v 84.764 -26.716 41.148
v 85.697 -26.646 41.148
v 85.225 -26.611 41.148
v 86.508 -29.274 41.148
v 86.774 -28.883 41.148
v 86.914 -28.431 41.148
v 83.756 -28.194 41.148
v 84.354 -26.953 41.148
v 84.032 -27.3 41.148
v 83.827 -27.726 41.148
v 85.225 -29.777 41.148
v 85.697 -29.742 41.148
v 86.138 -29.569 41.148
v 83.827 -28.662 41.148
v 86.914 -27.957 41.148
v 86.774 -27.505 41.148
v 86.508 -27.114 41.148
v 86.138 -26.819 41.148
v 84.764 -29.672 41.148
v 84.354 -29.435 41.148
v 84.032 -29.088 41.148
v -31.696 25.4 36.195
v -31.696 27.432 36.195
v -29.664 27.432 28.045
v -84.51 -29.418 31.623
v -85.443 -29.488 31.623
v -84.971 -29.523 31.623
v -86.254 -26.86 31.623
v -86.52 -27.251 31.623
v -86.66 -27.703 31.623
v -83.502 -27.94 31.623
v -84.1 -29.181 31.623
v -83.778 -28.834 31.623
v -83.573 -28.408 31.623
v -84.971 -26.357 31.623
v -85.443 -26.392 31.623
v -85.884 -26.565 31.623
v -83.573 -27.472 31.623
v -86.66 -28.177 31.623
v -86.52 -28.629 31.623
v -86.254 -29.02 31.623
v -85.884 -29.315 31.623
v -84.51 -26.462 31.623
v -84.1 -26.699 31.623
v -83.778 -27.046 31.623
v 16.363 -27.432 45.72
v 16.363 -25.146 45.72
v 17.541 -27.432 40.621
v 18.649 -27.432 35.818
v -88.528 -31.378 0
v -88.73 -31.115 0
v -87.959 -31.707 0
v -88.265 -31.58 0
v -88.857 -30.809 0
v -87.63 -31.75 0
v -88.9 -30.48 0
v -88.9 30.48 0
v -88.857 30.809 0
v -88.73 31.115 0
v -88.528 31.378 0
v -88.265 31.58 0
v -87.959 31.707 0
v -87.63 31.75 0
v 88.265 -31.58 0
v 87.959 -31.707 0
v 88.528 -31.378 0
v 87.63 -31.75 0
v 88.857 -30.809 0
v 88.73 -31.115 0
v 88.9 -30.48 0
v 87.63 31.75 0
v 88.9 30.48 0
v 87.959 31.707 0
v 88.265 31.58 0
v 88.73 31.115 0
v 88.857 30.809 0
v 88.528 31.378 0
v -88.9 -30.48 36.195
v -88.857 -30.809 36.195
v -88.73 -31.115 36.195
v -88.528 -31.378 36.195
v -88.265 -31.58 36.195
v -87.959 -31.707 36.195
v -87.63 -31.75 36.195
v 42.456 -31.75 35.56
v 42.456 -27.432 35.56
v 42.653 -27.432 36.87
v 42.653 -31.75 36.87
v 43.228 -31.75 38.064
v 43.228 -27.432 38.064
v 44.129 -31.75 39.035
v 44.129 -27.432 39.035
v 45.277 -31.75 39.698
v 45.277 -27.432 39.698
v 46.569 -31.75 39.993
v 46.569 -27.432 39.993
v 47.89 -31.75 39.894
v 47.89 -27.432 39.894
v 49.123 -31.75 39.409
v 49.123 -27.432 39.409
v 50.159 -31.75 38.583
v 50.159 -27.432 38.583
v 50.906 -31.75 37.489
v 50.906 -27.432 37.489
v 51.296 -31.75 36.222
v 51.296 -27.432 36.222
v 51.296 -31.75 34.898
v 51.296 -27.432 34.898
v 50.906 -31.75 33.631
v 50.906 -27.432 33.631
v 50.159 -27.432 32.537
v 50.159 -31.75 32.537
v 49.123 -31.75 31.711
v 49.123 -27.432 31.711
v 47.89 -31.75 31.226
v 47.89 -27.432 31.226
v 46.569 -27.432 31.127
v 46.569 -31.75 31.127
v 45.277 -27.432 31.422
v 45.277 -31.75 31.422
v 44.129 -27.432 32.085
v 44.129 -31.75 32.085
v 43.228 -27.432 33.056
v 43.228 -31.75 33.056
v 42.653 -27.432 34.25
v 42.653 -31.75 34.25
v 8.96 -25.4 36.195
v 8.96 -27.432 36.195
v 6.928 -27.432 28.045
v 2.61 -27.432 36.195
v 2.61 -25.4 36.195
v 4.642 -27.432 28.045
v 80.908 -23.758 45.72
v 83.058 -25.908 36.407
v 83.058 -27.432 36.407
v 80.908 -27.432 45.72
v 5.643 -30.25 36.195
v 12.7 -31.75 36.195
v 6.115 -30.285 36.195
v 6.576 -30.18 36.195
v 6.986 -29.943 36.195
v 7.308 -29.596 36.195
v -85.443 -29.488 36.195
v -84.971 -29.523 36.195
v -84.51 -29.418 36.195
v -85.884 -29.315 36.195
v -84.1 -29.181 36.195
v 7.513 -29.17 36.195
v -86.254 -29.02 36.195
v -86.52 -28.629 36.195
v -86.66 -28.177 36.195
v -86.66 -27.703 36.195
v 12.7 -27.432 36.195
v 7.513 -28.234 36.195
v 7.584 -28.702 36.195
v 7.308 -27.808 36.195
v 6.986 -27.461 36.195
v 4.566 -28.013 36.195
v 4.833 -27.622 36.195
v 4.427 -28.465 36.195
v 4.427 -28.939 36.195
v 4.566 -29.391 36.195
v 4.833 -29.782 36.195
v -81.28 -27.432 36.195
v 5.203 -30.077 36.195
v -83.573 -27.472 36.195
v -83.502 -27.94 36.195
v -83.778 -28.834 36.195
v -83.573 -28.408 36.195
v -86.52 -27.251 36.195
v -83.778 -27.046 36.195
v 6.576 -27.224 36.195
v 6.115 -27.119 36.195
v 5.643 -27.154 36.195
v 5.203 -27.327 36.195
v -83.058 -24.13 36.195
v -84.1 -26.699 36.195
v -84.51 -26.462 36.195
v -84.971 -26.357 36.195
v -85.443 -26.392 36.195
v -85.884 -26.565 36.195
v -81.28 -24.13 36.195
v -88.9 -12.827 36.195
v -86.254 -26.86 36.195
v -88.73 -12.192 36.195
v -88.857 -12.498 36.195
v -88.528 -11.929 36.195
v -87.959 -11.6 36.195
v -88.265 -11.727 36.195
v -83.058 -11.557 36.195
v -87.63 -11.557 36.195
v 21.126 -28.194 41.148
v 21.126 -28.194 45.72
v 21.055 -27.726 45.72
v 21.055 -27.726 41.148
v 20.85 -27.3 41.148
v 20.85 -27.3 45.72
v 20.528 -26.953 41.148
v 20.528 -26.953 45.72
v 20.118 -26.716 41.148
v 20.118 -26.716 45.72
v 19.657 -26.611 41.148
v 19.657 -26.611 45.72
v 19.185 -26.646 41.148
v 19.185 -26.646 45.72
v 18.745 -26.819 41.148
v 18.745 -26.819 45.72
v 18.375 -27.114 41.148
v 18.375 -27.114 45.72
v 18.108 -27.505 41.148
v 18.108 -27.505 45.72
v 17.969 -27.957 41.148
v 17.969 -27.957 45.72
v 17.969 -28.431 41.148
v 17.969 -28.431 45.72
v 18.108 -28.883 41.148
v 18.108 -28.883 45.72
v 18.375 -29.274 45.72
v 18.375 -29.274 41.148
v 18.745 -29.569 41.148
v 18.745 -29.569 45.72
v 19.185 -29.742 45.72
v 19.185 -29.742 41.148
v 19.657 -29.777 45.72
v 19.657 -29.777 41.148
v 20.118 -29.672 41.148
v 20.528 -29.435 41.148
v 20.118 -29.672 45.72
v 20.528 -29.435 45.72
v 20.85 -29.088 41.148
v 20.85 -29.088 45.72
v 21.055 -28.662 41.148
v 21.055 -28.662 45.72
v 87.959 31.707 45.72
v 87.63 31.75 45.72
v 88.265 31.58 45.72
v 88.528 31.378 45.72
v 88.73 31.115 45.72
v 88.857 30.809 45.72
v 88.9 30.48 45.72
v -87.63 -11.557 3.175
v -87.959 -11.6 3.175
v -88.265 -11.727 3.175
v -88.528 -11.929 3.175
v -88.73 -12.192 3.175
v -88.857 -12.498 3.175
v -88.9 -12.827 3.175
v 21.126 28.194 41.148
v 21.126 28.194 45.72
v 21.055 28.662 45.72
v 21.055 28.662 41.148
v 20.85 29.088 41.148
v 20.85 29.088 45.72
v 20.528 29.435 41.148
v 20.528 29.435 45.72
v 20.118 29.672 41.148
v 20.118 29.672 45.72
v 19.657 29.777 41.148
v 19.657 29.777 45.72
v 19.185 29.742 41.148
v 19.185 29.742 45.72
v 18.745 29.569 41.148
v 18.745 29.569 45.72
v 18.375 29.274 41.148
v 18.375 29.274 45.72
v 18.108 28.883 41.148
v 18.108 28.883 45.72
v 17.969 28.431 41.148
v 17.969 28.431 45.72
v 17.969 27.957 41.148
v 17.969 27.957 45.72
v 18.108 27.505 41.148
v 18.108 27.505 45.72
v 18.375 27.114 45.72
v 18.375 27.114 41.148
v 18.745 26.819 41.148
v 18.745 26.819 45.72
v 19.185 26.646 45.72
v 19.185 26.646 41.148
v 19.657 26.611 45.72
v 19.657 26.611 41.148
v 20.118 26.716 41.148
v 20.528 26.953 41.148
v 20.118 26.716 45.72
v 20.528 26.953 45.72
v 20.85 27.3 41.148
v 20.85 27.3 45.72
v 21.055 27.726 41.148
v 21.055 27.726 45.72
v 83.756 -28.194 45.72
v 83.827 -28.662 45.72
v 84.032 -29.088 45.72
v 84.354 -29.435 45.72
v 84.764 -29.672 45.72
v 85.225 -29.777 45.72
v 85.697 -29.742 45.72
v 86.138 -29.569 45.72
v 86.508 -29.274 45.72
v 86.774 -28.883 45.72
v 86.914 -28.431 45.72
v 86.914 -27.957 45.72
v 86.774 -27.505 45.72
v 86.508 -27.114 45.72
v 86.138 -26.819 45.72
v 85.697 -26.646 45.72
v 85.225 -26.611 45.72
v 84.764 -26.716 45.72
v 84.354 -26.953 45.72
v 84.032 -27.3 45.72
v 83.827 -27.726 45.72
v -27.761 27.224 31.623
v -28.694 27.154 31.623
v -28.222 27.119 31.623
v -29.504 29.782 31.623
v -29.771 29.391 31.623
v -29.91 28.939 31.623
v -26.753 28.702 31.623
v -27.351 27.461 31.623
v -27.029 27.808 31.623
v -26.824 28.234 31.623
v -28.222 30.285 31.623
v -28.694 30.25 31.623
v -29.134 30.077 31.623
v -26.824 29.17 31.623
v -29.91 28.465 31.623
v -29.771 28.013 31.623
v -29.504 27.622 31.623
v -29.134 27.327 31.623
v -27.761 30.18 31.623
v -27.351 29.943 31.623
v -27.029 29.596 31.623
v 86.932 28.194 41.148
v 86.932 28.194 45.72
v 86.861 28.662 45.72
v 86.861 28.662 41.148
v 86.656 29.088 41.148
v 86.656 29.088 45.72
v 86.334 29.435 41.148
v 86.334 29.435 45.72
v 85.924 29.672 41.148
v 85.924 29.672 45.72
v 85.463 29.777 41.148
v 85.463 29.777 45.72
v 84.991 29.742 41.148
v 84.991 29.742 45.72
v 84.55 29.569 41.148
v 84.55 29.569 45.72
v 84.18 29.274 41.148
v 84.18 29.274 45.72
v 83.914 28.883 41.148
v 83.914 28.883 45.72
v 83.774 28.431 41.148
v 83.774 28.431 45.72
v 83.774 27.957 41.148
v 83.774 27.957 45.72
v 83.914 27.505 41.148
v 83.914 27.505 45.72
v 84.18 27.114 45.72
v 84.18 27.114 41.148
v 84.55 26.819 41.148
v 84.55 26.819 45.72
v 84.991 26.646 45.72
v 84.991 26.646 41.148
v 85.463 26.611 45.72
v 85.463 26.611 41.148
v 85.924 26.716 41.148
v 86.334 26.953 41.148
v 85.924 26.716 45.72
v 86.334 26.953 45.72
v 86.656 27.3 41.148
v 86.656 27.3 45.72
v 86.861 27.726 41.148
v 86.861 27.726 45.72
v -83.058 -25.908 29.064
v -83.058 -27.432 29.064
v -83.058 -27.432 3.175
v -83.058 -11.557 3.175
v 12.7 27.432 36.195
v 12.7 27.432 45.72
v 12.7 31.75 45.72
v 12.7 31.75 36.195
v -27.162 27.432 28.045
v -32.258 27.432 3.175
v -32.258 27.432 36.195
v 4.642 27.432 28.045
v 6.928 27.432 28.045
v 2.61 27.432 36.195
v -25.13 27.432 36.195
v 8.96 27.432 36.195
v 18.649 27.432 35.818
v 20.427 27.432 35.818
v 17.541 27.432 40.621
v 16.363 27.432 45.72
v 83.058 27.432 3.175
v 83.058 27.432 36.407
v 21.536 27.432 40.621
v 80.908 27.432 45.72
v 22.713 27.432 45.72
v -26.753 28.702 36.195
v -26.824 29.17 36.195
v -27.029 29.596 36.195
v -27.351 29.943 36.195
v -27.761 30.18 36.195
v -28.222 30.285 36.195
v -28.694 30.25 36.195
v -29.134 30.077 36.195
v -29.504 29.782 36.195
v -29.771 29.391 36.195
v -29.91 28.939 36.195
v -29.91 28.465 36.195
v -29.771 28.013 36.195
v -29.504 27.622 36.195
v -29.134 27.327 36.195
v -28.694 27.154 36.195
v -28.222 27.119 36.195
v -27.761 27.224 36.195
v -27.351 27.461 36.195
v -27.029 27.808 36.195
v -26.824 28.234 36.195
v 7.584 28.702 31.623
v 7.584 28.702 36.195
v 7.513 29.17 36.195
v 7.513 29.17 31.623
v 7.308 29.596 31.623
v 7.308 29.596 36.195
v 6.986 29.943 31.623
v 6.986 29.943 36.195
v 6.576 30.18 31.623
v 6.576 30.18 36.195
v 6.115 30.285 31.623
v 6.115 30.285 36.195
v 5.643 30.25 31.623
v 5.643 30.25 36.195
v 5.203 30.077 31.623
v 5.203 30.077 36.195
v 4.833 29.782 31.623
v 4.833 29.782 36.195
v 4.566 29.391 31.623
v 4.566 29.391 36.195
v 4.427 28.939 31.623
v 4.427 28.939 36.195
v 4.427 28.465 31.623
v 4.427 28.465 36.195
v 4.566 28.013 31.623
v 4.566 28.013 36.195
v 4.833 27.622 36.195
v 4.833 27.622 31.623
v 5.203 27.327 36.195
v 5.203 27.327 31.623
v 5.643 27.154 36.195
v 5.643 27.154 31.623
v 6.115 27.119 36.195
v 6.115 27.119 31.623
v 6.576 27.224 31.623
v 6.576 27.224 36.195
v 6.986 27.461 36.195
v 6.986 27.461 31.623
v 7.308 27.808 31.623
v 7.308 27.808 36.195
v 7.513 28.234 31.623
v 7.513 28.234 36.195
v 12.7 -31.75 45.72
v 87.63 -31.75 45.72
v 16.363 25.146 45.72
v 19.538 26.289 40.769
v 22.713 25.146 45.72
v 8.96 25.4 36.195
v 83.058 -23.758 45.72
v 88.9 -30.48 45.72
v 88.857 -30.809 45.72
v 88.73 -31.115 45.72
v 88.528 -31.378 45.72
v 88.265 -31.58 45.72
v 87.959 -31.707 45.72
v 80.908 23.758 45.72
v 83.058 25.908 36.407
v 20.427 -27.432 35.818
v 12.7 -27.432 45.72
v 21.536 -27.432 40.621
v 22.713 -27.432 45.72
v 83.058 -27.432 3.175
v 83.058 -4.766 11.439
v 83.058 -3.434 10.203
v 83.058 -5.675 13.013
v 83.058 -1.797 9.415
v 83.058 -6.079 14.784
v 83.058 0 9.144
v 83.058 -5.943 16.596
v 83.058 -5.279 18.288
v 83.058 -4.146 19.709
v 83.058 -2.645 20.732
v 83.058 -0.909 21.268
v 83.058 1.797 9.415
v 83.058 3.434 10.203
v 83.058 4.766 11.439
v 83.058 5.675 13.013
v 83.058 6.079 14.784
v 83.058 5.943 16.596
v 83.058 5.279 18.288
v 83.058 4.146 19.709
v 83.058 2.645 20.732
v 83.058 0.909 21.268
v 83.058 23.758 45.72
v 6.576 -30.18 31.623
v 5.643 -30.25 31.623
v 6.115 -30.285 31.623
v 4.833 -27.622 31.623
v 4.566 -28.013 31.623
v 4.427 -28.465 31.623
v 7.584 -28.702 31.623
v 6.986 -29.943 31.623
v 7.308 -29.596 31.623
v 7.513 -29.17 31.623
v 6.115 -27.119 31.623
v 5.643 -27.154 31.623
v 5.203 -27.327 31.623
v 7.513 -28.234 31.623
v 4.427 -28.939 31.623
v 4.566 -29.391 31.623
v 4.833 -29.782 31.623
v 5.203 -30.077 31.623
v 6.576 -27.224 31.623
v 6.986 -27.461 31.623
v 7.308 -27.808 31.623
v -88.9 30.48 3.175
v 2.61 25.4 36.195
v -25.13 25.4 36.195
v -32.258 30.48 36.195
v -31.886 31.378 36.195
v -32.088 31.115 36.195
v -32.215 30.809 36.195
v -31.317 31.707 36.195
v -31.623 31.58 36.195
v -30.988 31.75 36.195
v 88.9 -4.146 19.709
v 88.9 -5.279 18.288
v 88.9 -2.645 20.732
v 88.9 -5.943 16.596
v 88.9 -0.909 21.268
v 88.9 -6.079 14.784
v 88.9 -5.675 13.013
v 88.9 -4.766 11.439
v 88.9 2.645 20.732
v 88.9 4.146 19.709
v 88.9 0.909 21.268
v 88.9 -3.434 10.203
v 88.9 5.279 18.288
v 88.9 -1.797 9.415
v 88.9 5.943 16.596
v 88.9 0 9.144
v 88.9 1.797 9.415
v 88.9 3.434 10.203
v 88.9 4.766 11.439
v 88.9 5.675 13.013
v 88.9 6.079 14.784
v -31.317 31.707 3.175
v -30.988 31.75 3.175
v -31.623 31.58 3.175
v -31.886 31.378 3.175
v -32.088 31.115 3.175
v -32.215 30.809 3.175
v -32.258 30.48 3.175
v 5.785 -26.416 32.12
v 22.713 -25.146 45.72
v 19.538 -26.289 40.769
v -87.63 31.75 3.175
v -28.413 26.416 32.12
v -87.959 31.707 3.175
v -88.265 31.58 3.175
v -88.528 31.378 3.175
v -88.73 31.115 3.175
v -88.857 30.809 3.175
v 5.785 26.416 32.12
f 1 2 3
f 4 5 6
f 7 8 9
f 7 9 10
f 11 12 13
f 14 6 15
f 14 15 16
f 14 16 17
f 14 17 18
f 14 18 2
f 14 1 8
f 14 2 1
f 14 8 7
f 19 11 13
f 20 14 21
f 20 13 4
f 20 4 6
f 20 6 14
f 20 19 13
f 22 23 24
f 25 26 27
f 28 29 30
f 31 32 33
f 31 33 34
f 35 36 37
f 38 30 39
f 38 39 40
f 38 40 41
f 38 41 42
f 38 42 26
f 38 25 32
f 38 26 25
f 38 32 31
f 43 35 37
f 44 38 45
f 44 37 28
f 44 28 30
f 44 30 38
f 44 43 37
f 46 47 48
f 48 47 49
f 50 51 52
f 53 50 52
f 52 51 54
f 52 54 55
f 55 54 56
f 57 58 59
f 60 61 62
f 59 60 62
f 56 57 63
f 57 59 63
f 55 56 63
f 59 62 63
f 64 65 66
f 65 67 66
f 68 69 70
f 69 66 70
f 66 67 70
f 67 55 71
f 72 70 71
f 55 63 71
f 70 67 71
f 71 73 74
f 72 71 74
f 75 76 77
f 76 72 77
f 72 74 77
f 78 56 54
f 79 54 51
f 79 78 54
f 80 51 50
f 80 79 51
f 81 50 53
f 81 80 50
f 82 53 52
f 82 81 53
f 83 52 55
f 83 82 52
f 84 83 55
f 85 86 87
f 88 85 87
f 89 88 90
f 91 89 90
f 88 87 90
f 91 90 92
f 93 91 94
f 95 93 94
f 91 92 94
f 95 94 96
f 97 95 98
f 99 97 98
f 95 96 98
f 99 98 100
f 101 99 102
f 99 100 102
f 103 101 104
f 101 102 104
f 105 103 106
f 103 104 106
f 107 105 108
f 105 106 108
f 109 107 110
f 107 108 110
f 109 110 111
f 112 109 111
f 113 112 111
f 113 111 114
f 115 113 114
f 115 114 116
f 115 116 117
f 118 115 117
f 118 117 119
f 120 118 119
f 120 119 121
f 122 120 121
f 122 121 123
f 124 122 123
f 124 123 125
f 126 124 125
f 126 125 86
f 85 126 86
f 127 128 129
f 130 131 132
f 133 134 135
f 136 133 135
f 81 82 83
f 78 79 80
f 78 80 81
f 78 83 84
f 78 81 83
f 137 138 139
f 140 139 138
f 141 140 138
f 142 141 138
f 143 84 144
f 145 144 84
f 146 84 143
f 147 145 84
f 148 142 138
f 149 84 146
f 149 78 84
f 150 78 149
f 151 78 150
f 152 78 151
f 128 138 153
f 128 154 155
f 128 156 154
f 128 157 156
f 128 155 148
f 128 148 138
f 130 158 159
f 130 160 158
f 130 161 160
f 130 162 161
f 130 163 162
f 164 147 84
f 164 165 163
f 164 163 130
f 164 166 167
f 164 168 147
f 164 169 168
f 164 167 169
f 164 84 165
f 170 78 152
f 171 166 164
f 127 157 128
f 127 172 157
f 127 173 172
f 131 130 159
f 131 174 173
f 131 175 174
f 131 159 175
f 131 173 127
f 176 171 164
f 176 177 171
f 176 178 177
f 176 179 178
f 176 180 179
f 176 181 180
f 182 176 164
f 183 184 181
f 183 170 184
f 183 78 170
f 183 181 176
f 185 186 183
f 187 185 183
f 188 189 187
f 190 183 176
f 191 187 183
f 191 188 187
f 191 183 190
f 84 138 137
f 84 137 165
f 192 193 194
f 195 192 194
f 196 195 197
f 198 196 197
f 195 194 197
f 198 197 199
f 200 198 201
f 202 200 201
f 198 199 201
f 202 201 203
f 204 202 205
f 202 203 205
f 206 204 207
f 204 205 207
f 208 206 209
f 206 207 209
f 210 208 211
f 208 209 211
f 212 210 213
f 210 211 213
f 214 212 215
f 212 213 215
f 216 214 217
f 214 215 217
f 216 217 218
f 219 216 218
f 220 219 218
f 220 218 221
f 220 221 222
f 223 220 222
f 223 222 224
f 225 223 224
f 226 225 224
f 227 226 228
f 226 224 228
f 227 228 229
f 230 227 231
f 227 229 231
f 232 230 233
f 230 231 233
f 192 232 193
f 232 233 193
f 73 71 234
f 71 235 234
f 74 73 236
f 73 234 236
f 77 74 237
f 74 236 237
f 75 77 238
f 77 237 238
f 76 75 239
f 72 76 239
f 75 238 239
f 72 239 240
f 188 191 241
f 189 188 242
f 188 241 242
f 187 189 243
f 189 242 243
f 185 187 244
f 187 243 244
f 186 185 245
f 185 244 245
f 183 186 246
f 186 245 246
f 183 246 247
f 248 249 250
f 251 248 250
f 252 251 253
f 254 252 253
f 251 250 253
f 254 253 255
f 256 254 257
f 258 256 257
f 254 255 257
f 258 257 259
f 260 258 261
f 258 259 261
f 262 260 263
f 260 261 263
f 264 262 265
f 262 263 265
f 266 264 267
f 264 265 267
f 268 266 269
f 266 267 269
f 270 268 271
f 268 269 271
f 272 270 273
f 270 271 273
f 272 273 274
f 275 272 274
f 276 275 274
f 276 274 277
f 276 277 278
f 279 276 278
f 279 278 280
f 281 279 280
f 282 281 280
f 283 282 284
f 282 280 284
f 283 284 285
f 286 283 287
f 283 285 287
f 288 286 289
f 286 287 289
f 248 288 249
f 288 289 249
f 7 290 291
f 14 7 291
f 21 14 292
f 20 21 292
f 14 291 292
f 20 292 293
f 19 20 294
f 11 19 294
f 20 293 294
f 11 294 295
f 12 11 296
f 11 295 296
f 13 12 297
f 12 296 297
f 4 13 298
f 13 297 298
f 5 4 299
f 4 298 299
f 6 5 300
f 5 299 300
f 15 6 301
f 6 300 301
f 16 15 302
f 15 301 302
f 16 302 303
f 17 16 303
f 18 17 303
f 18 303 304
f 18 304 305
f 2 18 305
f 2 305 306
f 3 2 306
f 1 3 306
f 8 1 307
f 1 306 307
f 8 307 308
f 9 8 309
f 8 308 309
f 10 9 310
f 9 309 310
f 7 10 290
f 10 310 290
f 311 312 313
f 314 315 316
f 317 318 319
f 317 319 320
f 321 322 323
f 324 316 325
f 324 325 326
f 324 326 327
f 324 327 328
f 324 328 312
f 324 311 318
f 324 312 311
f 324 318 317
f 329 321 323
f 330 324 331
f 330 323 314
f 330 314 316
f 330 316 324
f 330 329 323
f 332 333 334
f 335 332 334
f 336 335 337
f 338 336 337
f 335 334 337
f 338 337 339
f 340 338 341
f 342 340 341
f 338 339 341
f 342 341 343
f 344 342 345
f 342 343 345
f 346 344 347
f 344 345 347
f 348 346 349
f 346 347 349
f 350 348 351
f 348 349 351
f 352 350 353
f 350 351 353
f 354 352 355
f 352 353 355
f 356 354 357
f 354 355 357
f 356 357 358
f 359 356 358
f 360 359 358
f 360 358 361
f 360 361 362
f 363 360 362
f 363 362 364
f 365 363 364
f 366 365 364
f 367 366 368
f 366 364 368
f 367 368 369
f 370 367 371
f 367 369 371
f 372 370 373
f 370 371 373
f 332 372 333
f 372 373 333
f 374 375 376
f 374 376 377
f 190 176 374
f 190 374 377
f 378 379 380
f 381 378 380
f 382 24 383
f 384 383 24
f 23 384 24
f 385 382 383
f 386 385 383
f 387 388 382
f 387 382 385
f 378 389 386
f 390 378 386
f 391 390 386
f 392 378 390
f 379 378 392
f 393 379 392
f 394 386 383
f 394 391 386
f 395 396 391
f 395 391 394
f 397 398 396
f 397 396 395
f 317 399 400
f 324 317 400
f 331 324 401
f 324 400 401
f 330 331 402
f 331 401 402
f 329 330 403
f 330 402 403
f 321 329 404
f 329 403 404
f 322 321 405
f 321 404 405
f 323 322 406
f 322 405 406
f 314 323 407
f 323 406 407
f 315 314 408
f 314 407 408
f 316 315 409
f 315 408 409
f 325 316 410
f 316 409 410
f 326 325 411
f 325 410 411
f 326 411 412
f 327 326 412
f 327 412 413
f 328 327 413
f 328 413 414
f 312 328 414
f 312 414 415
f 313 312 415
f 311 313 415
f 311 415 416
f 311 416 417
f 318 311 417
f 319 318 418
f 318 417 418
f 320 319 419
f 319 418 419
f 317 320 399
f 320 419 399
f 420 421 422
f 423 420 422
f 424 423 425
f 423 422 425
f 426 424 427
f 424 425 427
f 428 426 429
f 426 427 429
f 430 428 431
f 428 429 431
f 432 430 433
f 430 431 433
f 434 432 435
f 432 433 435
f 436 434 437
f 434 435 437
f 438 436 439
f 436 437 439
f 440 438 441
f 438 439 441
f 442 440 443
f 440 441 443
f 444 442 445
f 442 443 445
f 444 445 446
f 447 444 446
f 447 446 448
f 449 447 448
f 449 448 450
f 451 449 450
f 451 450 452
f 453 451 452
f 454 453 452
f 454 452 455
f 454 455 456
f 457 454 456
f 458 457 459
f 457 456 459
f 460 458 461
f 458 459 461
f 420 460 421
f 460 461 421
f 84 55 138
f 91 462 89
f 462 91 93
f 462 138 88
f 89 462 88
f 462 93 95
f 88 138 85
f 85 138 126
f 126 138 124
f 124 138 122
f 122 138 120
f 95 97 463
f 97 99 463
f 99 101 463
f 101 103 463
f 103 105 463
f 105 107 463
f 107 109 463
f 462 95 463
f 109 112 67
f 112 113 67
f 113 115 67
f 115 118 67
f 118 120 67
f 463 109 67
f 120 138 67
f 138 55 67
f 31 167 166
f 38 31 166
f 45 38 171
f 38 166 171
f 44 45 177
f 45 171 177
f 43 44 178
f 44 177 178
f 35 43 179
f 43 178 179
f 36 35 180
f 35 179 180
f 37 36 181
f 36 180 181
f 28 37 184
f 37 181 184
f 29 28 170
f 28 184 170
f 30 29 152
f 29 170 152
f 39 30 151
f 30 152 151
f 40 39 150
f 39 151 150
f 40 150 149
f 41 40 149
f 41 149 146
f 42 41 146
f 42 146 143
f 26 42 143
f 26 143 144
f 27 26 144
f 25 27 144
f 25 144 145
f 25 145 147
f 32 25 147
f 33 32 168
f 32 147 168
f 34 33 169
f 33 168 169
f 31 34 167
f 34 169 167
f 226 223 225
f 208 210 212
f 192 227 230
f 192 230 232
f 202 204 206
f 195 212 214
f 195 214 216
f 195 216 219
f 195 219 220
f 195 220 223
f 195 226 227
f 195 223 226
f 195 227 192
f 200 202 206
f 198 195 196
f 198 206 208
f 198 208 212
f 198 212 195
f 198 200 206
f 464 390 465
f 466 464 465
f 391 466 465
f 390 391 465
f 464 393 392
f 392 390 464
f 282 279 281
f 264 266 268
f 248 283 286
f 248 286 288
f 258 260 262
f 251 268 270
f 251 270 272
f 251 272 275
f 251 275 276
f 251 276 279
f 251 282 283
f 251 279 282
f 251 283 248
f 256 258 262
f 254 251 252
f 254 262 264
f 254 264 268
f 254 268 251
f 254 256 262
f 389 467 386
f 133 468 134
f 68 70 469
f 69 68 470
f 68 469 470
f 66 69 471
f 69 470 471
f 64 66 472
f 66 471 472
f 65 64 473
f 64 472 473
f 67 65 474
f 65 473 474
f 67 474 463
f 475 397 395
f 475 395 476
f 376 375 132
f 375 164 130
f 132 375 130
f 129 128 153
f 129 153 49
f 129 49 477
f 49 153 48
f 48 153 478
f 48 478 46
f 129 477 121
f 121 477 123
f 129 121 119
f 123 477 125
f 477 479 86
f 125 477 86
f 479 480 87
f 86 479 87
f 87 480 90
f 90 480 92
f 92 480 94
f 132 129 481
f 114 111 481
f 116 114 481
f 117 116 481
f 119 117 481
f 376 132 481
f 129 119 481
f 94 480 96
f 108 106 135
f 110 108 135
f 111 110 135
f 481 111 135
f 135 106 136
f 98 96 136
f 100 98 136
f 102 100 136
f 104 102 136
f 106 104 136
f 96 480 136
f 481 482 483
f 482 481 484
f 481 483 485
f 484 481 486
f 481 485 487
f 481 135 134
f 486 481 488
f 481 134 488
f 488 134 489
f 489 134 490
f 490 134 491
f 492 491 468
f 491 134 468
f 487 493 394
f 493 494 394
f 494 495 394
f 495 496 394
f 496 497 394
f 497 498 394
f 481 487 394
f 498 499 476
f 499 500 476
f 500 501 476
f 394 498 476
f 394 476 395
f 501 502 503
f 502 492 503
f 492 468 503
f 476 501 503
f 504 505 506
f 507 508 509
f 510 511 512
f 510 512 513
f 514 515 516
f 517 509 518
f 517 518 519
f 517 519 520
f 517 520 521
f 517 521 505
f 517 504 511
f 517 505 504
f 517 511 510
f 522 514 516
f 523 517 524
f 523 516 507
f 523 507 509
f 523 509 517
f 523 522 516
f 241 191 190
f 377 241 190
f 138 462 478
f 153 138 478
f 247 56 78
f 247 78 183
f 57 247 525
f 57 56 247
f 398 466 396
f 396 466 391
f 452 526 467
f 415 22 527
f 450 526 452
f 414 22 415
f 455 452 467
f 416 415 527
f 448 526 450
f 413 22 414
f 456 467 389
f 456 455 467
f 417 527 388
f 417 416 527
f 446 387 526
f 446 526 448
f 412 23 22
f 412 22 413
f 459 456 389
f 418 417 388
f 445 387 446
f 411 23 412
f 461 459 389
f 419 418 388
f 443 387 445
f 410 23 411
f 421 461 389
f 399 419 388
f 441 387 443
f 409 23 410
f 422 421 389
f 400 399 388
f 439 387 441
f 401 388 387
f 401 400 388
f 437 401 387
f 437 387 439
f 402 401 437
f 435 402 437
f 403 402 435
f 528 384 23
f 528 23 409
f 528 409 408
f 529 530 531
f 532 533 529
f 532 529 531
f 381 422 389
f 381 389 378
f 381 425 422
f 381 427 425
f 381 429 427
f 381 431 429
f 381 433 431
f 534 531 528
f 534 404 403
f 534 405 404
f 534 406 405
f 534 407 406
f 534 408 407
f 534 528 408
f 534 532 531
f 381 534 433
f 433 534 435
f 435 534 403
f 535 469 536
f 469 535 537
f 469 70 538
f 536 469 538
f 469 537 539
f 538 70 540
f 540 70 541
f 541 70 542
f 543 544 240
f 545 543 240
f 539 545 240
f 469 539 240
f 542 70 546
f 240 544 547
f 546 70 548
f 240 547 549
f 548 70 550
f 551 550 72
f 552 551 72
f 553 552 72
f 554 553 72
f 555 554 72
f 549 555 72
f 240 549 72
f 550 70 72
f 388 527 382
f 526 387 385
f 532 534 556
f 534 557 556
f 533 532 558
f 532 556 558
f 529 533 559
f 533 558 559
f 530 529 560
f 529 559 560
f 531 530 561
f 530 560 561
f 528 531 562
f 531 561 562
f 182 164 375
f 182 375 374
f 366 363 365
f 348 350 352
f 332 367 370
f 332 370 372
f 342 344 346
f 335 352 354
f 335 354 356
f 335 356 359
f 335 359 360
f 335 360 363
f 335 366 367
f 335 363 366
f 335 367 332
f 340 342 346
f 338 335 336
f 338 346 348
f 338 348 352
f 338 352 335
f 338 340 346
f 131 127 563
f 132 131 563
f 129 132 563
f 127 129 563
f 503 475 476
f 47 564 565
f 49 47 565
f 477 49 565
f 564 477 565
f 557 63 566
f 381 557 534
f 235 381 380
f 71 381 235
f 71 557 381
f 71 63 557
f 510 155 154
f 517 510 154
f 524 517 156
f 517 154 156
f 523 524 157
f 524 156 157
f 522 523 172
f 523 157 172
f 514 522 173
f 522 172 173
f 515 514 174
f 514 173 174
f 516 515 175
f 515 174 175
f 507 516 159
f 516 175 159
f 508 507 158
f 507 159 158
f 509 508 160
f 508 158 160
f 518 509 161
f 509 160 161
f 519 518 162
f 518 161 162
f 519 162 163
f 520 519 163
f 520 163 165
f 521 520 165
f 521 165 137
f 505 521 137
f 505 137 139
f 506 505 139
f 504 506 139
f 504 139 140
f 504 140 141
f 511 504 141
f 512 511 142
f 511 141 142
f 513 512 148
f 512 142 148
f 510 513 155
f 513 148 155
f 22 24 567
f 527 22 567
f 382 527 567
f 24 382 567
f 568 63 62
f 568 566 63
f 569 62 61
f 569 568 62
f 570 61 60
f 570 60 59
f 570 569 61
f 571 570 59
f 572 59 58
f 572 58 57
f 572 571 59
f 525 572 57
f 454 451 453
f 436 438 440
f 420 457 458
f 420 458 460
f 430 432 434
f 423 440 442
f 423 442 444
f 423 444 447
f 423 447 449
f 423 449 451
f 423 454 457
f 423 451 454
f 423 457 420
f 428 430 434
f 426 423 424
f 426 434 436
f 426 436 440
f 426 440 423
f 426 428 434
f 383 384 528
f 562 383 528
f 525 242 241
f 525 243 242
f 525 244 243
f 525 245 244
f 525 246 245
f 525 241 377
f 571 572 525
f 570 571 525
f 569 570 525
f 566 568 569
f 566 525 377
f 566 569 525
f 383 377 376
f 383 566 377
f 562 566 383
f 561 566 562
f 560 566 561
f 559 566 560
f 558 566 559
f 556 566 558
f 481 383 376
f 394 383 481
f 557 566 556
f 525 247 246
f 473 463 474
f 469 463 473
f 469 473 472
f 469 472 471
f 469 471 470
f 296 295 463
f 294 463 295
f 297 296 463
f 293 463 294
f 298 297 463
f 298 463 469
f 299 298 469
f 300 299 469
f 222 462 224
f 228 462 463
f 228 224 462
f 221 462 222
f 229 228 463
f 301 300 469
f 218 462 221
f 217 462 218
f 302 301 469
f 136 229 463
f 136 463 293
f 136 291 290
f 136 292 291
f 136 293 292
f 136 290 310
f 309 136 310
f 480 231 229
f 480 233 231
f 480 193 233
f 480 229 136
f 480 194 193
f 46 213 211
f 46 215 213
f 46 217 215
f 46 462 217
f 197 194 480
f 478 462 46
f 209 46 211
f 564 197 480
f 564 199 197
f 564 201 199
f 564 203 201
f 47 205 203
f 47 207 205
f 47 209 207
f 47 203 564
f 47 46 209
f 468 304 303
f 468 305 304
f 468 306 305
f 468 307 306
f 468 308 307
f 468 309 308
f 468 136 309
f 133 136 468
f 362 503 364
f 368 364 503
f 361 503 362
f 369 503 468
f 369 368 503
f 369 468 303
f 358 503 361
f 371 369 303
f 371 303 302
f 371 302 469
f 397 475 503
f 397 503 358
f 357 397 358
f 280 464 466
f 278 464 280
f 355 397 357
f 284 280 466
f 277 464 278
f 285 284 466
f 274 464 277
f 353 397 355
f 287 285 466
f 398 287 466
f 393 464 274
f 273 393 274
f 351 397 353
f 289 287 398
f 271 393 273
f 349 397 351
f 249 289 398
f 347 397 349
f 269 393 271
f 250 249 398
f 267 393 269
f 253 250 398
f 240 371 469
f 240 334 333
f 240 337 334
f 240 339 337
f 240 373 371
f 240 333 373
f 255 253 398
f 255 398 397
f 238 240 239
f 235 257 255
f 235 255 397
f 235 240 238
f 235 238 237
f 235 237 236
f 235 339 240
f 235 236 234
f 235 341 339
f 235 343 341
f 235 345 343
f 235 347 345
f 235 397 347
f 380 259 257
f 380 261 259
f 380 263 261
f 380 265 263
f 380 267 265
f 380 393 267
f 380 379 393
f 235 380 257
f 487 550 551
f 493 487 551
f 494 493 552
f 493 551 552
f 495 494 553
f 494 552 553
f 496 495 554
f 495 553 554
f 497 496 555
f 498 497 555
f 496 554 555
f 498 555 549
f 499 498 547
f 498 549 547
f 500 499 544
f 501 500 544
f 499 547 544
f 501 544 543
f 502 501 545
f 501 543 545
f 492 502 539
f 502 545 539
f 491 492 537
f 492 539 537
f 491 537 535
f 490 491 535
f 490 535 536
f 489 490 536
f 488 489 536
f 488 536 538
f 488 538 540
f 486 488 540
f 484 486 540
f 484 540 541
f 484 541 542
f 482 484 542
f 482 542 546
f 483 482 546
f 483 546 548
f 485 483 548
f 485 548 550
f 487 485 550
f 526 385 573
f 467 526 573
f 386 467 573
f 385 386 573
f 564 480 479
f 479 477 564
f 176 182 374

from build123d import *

# Parameters (mm, degrees)
SKETCH1_W           = 177.8
SKETCH1_H           = 63.5
BOSS_EXTRUDE1_DEPTH = 45.72
SKETCH2_W           = 101.6
SKETCH2_H           = 63.5
CUT_EXTRUDE1_DEPTH  = 9.525
SKETCH3_W           = 166.116
SKETCH3_H           = 54.864
CUT_EXTRUDE2_DEPTH  = 42.545
SKETCH4_R           = 6.096
CUT_EXTRUDE3_DEPTH  = 31.75
CUT_EXTRUDE4_START  = -43.18
SKETCH5_R           = 4.445
CUT_EXTRUDE4_DEPTH  = 31.75
SKETCH9_W           = 6.35
SKETCH9_H           = 6.35
SKETCH9_W_2         = 6.565288585
SKETCH9_W_3         = 7.62
SKETCH9_H_2         = 7.62
BOSS_EXTRUDE2_DEPTH = 10.16
BOSS_EXTRUDE2_TAPER = 14
SKETCH6_W           = 56.642
SKETCH6_H           = 43.307
CUT_EXTRUDE5_DEPTH  = 33.02
SKETCH8_R           = 1.5875
CUT_EXTRUDE7_DEPTH  = 4.572
FILLET1_R           = 1.27
FILLET2_R           = 1.27
SKETCH10_W          = 6.35
SKETCH10_H          = 6.604
SKETCH10_W_2        = 7.62
SKETCH10_H_2        = 7.62
BOSS_EXTRUDE3_DEPTH = 10.16
BOSS_EXTRUDE3_TAPER = 13
SKETCH7_R           = 1.5875
CUT_EXTRUDE6_DEPTH  = 4.572
FILLET3_R           = 1.27


with BuildPart() as part:
    # Sketch1 → Boss-Extrude1 (new body)
    with BuildSketch(Plane.XY):
        Rectangle(SKETCH1_W, SKETCH1_H)
    extrude(amount=BOSS_EXTRUDE1_DEPTH)

    # Sketch2 → Cut-Extrude1 (cut)
    with BuildSketch(Plane.XY.offset(45.72)):
        with Locations((-38.1, 0)):
            Rectangle(SKETCH2_W, SKETCH2_H)
    extrude(amount=-CUT_EXTRUDE1_DEPTH, mode=Mode.SUBTRACT)

    # Sketch3 → Cut-Extrude2 (cut)
    with BuildSketch(Plane.XY.offset(45.72)):
        Rectangle(SKETCH3_W, SKETCH3_H)
    extrude(amount=-CUT_EXTRUDE2_DEPTH, mode=Mode.SUBTRACT)

    # Sketch4 → Cut-Extrude3 (cut)
    with BuildSketch(Plane(origin=(88.9, 0, 0), x_dir=(0, 0, -1), z_dir=(1, 0, 0))):
        with Locations((-15.24, 0)):
            Circle(SKETCH4_R)
    extrude(amount=-CUT_EXTRUDE3_DEPTH, mode=Mode.SUBTRACT)

    # Sketch5 → Cut-Extrude4 (cut)
    with BuildSketch(Plane(origin=(0, 31.75, 0), x_dir=(1, 0, 0), z_dir=(0, 1, 0)).offset(CUT_EXTRUDE4_START)):
        with Locations(Location((46.900902689, -35.56, 0), (0, 0, 180))):  # turned: the seam where the file's is
            Circle(SKETCH5_R)
    extrude(amount=-CUT_EXTRUDE4_DEPTH, mode=Mode.SUBTRACT)

    # Sketch9 → Boss-Extrude2 (add)
    with BuildSketch(Plane.XY.offset(36.195)):
        with Locations((5.78513156, 28.575)):
            Rectangle(SKETCH9_W, SKETCH9_H)
        with Locations((-28.41302197, 28.575)):
            Rectangle(SKETCH9_W_2, SKETCH9_H)
        with Locations((5.78513156, -28.575)):
            Rectangle(SKETCH9_W, SKETCH9_H)
        with Locations((-85.09, -27.94)):
            Rectangle(SKETCH9_W_3, SKETCH9_H_2)
    extrude(amount=-BOSS_EXTRUDE2_DEPTH, taper=BOSS_EXTRUDE2_TAPER)

    # Sketch6 → Cut-Extrude5 (cut)
    with BuildSketch(Plane.XY.offset(36.195)):
        with Locations((-60.579, 10.0965)):
            Rectangle(SKETCH6_W, SKETCH6_H)
    extrude(amount=-CUT_EXTRUDE5_DEPTH, mode=Mode.SUBTRACT)

    # Sketch8 → Cut-Extrude7 (cut)
    with BuildSketch(Plane.XY.offset(36.195)):
        with Locations((5.996300657, 28.702)):
            Circle(SKETCH8_R)
        with Locations((-28.340687554, 28.702)):
            Circle(SKETCH8_R)
        with Locations((5.996300657, -28.702)):
            Circle(SKETCH8_R)
        with Locations((-85.09, -27.94)):
            Circle(SKETCH8_R)
    extrude(amount=-CUT_EXTRUDE7_DEPTH, mode=Mode.SUBTRACT)

    # Fillet1
    fillet1_edges = [part.edges().sort_by_distance(p)[0] for p in [
        (-32.258, 31.75, 19.685),
        (-88.9, -31.75, 18.0975),
        (88.9, 31.75, 22.86),
        (88.9, -31.75, 22.86),
    ]]
    fillet(fillet1_edges, radius=FILLET1_R)

    # Fillet2
    fillet2_edges = [part.edges().sort_by_distance(p)[0] for p in [
        (-88.9, -11.557, 19.685),
    ]]
    fillet(fillet2_edges, radius=FILLET2_R)

    # Sketch10 → Boss-Extrude3 (add)
    with BuildSketch(Plane.XY.offset(45.72)):
        with Locations((19.538431576, 28.448)):
            Rectangle(SKETCH10_W, SKETCH10_H)
        with Locations((84.718025612, 27.568025612)):
            Rectangle(SKETCH10_W_2, SKETCH10_H_2)
        with Locations((84.718025612, -27.568025612)):
            Rectangle(SKETCH10_W_2, SKETCH10_H_2)
        with Locations((19.538431576, -28.448)):
            Rectangle(SKETCH10_W, SKETCH10_H)
    extrude(amount=-BOSS_EXTRUDE3_DEPTH, taper=BOSS_EXTRUDE3_TAPER)

    # Sketch7 → Cut-Extrude6 (cut)
    with BuildSketch(Plane.XY.offset(45.72)):
        with Locations((85.344, 28.194)):
            Circle(SKETCH7_R)
        with Locations(Location((85.344, -28.194, 0), (0, 0, 180))):  # turned: the seam where the file's is
            Circle(SKETCH7_R)
        with Locations((19.538431576, 28.194)):
            Circle(SKETCH7_R)
        with Locations((19.538431576, -28.194)):
            Circle(SKETCH7_R)
    extrude(amount=-CUT_EXTRUDE6_DEPTH, mode=Mode.SUBTRACT)

    # Fillet3
    fillet3_edges = [part.edges().sort_by_distance(p)[0] for p in [
        (-88.9, 31.75, 1.5875),
    ]]
    fillet(fillet3_edges, radius=FILLET3_R)


solid = part.part
